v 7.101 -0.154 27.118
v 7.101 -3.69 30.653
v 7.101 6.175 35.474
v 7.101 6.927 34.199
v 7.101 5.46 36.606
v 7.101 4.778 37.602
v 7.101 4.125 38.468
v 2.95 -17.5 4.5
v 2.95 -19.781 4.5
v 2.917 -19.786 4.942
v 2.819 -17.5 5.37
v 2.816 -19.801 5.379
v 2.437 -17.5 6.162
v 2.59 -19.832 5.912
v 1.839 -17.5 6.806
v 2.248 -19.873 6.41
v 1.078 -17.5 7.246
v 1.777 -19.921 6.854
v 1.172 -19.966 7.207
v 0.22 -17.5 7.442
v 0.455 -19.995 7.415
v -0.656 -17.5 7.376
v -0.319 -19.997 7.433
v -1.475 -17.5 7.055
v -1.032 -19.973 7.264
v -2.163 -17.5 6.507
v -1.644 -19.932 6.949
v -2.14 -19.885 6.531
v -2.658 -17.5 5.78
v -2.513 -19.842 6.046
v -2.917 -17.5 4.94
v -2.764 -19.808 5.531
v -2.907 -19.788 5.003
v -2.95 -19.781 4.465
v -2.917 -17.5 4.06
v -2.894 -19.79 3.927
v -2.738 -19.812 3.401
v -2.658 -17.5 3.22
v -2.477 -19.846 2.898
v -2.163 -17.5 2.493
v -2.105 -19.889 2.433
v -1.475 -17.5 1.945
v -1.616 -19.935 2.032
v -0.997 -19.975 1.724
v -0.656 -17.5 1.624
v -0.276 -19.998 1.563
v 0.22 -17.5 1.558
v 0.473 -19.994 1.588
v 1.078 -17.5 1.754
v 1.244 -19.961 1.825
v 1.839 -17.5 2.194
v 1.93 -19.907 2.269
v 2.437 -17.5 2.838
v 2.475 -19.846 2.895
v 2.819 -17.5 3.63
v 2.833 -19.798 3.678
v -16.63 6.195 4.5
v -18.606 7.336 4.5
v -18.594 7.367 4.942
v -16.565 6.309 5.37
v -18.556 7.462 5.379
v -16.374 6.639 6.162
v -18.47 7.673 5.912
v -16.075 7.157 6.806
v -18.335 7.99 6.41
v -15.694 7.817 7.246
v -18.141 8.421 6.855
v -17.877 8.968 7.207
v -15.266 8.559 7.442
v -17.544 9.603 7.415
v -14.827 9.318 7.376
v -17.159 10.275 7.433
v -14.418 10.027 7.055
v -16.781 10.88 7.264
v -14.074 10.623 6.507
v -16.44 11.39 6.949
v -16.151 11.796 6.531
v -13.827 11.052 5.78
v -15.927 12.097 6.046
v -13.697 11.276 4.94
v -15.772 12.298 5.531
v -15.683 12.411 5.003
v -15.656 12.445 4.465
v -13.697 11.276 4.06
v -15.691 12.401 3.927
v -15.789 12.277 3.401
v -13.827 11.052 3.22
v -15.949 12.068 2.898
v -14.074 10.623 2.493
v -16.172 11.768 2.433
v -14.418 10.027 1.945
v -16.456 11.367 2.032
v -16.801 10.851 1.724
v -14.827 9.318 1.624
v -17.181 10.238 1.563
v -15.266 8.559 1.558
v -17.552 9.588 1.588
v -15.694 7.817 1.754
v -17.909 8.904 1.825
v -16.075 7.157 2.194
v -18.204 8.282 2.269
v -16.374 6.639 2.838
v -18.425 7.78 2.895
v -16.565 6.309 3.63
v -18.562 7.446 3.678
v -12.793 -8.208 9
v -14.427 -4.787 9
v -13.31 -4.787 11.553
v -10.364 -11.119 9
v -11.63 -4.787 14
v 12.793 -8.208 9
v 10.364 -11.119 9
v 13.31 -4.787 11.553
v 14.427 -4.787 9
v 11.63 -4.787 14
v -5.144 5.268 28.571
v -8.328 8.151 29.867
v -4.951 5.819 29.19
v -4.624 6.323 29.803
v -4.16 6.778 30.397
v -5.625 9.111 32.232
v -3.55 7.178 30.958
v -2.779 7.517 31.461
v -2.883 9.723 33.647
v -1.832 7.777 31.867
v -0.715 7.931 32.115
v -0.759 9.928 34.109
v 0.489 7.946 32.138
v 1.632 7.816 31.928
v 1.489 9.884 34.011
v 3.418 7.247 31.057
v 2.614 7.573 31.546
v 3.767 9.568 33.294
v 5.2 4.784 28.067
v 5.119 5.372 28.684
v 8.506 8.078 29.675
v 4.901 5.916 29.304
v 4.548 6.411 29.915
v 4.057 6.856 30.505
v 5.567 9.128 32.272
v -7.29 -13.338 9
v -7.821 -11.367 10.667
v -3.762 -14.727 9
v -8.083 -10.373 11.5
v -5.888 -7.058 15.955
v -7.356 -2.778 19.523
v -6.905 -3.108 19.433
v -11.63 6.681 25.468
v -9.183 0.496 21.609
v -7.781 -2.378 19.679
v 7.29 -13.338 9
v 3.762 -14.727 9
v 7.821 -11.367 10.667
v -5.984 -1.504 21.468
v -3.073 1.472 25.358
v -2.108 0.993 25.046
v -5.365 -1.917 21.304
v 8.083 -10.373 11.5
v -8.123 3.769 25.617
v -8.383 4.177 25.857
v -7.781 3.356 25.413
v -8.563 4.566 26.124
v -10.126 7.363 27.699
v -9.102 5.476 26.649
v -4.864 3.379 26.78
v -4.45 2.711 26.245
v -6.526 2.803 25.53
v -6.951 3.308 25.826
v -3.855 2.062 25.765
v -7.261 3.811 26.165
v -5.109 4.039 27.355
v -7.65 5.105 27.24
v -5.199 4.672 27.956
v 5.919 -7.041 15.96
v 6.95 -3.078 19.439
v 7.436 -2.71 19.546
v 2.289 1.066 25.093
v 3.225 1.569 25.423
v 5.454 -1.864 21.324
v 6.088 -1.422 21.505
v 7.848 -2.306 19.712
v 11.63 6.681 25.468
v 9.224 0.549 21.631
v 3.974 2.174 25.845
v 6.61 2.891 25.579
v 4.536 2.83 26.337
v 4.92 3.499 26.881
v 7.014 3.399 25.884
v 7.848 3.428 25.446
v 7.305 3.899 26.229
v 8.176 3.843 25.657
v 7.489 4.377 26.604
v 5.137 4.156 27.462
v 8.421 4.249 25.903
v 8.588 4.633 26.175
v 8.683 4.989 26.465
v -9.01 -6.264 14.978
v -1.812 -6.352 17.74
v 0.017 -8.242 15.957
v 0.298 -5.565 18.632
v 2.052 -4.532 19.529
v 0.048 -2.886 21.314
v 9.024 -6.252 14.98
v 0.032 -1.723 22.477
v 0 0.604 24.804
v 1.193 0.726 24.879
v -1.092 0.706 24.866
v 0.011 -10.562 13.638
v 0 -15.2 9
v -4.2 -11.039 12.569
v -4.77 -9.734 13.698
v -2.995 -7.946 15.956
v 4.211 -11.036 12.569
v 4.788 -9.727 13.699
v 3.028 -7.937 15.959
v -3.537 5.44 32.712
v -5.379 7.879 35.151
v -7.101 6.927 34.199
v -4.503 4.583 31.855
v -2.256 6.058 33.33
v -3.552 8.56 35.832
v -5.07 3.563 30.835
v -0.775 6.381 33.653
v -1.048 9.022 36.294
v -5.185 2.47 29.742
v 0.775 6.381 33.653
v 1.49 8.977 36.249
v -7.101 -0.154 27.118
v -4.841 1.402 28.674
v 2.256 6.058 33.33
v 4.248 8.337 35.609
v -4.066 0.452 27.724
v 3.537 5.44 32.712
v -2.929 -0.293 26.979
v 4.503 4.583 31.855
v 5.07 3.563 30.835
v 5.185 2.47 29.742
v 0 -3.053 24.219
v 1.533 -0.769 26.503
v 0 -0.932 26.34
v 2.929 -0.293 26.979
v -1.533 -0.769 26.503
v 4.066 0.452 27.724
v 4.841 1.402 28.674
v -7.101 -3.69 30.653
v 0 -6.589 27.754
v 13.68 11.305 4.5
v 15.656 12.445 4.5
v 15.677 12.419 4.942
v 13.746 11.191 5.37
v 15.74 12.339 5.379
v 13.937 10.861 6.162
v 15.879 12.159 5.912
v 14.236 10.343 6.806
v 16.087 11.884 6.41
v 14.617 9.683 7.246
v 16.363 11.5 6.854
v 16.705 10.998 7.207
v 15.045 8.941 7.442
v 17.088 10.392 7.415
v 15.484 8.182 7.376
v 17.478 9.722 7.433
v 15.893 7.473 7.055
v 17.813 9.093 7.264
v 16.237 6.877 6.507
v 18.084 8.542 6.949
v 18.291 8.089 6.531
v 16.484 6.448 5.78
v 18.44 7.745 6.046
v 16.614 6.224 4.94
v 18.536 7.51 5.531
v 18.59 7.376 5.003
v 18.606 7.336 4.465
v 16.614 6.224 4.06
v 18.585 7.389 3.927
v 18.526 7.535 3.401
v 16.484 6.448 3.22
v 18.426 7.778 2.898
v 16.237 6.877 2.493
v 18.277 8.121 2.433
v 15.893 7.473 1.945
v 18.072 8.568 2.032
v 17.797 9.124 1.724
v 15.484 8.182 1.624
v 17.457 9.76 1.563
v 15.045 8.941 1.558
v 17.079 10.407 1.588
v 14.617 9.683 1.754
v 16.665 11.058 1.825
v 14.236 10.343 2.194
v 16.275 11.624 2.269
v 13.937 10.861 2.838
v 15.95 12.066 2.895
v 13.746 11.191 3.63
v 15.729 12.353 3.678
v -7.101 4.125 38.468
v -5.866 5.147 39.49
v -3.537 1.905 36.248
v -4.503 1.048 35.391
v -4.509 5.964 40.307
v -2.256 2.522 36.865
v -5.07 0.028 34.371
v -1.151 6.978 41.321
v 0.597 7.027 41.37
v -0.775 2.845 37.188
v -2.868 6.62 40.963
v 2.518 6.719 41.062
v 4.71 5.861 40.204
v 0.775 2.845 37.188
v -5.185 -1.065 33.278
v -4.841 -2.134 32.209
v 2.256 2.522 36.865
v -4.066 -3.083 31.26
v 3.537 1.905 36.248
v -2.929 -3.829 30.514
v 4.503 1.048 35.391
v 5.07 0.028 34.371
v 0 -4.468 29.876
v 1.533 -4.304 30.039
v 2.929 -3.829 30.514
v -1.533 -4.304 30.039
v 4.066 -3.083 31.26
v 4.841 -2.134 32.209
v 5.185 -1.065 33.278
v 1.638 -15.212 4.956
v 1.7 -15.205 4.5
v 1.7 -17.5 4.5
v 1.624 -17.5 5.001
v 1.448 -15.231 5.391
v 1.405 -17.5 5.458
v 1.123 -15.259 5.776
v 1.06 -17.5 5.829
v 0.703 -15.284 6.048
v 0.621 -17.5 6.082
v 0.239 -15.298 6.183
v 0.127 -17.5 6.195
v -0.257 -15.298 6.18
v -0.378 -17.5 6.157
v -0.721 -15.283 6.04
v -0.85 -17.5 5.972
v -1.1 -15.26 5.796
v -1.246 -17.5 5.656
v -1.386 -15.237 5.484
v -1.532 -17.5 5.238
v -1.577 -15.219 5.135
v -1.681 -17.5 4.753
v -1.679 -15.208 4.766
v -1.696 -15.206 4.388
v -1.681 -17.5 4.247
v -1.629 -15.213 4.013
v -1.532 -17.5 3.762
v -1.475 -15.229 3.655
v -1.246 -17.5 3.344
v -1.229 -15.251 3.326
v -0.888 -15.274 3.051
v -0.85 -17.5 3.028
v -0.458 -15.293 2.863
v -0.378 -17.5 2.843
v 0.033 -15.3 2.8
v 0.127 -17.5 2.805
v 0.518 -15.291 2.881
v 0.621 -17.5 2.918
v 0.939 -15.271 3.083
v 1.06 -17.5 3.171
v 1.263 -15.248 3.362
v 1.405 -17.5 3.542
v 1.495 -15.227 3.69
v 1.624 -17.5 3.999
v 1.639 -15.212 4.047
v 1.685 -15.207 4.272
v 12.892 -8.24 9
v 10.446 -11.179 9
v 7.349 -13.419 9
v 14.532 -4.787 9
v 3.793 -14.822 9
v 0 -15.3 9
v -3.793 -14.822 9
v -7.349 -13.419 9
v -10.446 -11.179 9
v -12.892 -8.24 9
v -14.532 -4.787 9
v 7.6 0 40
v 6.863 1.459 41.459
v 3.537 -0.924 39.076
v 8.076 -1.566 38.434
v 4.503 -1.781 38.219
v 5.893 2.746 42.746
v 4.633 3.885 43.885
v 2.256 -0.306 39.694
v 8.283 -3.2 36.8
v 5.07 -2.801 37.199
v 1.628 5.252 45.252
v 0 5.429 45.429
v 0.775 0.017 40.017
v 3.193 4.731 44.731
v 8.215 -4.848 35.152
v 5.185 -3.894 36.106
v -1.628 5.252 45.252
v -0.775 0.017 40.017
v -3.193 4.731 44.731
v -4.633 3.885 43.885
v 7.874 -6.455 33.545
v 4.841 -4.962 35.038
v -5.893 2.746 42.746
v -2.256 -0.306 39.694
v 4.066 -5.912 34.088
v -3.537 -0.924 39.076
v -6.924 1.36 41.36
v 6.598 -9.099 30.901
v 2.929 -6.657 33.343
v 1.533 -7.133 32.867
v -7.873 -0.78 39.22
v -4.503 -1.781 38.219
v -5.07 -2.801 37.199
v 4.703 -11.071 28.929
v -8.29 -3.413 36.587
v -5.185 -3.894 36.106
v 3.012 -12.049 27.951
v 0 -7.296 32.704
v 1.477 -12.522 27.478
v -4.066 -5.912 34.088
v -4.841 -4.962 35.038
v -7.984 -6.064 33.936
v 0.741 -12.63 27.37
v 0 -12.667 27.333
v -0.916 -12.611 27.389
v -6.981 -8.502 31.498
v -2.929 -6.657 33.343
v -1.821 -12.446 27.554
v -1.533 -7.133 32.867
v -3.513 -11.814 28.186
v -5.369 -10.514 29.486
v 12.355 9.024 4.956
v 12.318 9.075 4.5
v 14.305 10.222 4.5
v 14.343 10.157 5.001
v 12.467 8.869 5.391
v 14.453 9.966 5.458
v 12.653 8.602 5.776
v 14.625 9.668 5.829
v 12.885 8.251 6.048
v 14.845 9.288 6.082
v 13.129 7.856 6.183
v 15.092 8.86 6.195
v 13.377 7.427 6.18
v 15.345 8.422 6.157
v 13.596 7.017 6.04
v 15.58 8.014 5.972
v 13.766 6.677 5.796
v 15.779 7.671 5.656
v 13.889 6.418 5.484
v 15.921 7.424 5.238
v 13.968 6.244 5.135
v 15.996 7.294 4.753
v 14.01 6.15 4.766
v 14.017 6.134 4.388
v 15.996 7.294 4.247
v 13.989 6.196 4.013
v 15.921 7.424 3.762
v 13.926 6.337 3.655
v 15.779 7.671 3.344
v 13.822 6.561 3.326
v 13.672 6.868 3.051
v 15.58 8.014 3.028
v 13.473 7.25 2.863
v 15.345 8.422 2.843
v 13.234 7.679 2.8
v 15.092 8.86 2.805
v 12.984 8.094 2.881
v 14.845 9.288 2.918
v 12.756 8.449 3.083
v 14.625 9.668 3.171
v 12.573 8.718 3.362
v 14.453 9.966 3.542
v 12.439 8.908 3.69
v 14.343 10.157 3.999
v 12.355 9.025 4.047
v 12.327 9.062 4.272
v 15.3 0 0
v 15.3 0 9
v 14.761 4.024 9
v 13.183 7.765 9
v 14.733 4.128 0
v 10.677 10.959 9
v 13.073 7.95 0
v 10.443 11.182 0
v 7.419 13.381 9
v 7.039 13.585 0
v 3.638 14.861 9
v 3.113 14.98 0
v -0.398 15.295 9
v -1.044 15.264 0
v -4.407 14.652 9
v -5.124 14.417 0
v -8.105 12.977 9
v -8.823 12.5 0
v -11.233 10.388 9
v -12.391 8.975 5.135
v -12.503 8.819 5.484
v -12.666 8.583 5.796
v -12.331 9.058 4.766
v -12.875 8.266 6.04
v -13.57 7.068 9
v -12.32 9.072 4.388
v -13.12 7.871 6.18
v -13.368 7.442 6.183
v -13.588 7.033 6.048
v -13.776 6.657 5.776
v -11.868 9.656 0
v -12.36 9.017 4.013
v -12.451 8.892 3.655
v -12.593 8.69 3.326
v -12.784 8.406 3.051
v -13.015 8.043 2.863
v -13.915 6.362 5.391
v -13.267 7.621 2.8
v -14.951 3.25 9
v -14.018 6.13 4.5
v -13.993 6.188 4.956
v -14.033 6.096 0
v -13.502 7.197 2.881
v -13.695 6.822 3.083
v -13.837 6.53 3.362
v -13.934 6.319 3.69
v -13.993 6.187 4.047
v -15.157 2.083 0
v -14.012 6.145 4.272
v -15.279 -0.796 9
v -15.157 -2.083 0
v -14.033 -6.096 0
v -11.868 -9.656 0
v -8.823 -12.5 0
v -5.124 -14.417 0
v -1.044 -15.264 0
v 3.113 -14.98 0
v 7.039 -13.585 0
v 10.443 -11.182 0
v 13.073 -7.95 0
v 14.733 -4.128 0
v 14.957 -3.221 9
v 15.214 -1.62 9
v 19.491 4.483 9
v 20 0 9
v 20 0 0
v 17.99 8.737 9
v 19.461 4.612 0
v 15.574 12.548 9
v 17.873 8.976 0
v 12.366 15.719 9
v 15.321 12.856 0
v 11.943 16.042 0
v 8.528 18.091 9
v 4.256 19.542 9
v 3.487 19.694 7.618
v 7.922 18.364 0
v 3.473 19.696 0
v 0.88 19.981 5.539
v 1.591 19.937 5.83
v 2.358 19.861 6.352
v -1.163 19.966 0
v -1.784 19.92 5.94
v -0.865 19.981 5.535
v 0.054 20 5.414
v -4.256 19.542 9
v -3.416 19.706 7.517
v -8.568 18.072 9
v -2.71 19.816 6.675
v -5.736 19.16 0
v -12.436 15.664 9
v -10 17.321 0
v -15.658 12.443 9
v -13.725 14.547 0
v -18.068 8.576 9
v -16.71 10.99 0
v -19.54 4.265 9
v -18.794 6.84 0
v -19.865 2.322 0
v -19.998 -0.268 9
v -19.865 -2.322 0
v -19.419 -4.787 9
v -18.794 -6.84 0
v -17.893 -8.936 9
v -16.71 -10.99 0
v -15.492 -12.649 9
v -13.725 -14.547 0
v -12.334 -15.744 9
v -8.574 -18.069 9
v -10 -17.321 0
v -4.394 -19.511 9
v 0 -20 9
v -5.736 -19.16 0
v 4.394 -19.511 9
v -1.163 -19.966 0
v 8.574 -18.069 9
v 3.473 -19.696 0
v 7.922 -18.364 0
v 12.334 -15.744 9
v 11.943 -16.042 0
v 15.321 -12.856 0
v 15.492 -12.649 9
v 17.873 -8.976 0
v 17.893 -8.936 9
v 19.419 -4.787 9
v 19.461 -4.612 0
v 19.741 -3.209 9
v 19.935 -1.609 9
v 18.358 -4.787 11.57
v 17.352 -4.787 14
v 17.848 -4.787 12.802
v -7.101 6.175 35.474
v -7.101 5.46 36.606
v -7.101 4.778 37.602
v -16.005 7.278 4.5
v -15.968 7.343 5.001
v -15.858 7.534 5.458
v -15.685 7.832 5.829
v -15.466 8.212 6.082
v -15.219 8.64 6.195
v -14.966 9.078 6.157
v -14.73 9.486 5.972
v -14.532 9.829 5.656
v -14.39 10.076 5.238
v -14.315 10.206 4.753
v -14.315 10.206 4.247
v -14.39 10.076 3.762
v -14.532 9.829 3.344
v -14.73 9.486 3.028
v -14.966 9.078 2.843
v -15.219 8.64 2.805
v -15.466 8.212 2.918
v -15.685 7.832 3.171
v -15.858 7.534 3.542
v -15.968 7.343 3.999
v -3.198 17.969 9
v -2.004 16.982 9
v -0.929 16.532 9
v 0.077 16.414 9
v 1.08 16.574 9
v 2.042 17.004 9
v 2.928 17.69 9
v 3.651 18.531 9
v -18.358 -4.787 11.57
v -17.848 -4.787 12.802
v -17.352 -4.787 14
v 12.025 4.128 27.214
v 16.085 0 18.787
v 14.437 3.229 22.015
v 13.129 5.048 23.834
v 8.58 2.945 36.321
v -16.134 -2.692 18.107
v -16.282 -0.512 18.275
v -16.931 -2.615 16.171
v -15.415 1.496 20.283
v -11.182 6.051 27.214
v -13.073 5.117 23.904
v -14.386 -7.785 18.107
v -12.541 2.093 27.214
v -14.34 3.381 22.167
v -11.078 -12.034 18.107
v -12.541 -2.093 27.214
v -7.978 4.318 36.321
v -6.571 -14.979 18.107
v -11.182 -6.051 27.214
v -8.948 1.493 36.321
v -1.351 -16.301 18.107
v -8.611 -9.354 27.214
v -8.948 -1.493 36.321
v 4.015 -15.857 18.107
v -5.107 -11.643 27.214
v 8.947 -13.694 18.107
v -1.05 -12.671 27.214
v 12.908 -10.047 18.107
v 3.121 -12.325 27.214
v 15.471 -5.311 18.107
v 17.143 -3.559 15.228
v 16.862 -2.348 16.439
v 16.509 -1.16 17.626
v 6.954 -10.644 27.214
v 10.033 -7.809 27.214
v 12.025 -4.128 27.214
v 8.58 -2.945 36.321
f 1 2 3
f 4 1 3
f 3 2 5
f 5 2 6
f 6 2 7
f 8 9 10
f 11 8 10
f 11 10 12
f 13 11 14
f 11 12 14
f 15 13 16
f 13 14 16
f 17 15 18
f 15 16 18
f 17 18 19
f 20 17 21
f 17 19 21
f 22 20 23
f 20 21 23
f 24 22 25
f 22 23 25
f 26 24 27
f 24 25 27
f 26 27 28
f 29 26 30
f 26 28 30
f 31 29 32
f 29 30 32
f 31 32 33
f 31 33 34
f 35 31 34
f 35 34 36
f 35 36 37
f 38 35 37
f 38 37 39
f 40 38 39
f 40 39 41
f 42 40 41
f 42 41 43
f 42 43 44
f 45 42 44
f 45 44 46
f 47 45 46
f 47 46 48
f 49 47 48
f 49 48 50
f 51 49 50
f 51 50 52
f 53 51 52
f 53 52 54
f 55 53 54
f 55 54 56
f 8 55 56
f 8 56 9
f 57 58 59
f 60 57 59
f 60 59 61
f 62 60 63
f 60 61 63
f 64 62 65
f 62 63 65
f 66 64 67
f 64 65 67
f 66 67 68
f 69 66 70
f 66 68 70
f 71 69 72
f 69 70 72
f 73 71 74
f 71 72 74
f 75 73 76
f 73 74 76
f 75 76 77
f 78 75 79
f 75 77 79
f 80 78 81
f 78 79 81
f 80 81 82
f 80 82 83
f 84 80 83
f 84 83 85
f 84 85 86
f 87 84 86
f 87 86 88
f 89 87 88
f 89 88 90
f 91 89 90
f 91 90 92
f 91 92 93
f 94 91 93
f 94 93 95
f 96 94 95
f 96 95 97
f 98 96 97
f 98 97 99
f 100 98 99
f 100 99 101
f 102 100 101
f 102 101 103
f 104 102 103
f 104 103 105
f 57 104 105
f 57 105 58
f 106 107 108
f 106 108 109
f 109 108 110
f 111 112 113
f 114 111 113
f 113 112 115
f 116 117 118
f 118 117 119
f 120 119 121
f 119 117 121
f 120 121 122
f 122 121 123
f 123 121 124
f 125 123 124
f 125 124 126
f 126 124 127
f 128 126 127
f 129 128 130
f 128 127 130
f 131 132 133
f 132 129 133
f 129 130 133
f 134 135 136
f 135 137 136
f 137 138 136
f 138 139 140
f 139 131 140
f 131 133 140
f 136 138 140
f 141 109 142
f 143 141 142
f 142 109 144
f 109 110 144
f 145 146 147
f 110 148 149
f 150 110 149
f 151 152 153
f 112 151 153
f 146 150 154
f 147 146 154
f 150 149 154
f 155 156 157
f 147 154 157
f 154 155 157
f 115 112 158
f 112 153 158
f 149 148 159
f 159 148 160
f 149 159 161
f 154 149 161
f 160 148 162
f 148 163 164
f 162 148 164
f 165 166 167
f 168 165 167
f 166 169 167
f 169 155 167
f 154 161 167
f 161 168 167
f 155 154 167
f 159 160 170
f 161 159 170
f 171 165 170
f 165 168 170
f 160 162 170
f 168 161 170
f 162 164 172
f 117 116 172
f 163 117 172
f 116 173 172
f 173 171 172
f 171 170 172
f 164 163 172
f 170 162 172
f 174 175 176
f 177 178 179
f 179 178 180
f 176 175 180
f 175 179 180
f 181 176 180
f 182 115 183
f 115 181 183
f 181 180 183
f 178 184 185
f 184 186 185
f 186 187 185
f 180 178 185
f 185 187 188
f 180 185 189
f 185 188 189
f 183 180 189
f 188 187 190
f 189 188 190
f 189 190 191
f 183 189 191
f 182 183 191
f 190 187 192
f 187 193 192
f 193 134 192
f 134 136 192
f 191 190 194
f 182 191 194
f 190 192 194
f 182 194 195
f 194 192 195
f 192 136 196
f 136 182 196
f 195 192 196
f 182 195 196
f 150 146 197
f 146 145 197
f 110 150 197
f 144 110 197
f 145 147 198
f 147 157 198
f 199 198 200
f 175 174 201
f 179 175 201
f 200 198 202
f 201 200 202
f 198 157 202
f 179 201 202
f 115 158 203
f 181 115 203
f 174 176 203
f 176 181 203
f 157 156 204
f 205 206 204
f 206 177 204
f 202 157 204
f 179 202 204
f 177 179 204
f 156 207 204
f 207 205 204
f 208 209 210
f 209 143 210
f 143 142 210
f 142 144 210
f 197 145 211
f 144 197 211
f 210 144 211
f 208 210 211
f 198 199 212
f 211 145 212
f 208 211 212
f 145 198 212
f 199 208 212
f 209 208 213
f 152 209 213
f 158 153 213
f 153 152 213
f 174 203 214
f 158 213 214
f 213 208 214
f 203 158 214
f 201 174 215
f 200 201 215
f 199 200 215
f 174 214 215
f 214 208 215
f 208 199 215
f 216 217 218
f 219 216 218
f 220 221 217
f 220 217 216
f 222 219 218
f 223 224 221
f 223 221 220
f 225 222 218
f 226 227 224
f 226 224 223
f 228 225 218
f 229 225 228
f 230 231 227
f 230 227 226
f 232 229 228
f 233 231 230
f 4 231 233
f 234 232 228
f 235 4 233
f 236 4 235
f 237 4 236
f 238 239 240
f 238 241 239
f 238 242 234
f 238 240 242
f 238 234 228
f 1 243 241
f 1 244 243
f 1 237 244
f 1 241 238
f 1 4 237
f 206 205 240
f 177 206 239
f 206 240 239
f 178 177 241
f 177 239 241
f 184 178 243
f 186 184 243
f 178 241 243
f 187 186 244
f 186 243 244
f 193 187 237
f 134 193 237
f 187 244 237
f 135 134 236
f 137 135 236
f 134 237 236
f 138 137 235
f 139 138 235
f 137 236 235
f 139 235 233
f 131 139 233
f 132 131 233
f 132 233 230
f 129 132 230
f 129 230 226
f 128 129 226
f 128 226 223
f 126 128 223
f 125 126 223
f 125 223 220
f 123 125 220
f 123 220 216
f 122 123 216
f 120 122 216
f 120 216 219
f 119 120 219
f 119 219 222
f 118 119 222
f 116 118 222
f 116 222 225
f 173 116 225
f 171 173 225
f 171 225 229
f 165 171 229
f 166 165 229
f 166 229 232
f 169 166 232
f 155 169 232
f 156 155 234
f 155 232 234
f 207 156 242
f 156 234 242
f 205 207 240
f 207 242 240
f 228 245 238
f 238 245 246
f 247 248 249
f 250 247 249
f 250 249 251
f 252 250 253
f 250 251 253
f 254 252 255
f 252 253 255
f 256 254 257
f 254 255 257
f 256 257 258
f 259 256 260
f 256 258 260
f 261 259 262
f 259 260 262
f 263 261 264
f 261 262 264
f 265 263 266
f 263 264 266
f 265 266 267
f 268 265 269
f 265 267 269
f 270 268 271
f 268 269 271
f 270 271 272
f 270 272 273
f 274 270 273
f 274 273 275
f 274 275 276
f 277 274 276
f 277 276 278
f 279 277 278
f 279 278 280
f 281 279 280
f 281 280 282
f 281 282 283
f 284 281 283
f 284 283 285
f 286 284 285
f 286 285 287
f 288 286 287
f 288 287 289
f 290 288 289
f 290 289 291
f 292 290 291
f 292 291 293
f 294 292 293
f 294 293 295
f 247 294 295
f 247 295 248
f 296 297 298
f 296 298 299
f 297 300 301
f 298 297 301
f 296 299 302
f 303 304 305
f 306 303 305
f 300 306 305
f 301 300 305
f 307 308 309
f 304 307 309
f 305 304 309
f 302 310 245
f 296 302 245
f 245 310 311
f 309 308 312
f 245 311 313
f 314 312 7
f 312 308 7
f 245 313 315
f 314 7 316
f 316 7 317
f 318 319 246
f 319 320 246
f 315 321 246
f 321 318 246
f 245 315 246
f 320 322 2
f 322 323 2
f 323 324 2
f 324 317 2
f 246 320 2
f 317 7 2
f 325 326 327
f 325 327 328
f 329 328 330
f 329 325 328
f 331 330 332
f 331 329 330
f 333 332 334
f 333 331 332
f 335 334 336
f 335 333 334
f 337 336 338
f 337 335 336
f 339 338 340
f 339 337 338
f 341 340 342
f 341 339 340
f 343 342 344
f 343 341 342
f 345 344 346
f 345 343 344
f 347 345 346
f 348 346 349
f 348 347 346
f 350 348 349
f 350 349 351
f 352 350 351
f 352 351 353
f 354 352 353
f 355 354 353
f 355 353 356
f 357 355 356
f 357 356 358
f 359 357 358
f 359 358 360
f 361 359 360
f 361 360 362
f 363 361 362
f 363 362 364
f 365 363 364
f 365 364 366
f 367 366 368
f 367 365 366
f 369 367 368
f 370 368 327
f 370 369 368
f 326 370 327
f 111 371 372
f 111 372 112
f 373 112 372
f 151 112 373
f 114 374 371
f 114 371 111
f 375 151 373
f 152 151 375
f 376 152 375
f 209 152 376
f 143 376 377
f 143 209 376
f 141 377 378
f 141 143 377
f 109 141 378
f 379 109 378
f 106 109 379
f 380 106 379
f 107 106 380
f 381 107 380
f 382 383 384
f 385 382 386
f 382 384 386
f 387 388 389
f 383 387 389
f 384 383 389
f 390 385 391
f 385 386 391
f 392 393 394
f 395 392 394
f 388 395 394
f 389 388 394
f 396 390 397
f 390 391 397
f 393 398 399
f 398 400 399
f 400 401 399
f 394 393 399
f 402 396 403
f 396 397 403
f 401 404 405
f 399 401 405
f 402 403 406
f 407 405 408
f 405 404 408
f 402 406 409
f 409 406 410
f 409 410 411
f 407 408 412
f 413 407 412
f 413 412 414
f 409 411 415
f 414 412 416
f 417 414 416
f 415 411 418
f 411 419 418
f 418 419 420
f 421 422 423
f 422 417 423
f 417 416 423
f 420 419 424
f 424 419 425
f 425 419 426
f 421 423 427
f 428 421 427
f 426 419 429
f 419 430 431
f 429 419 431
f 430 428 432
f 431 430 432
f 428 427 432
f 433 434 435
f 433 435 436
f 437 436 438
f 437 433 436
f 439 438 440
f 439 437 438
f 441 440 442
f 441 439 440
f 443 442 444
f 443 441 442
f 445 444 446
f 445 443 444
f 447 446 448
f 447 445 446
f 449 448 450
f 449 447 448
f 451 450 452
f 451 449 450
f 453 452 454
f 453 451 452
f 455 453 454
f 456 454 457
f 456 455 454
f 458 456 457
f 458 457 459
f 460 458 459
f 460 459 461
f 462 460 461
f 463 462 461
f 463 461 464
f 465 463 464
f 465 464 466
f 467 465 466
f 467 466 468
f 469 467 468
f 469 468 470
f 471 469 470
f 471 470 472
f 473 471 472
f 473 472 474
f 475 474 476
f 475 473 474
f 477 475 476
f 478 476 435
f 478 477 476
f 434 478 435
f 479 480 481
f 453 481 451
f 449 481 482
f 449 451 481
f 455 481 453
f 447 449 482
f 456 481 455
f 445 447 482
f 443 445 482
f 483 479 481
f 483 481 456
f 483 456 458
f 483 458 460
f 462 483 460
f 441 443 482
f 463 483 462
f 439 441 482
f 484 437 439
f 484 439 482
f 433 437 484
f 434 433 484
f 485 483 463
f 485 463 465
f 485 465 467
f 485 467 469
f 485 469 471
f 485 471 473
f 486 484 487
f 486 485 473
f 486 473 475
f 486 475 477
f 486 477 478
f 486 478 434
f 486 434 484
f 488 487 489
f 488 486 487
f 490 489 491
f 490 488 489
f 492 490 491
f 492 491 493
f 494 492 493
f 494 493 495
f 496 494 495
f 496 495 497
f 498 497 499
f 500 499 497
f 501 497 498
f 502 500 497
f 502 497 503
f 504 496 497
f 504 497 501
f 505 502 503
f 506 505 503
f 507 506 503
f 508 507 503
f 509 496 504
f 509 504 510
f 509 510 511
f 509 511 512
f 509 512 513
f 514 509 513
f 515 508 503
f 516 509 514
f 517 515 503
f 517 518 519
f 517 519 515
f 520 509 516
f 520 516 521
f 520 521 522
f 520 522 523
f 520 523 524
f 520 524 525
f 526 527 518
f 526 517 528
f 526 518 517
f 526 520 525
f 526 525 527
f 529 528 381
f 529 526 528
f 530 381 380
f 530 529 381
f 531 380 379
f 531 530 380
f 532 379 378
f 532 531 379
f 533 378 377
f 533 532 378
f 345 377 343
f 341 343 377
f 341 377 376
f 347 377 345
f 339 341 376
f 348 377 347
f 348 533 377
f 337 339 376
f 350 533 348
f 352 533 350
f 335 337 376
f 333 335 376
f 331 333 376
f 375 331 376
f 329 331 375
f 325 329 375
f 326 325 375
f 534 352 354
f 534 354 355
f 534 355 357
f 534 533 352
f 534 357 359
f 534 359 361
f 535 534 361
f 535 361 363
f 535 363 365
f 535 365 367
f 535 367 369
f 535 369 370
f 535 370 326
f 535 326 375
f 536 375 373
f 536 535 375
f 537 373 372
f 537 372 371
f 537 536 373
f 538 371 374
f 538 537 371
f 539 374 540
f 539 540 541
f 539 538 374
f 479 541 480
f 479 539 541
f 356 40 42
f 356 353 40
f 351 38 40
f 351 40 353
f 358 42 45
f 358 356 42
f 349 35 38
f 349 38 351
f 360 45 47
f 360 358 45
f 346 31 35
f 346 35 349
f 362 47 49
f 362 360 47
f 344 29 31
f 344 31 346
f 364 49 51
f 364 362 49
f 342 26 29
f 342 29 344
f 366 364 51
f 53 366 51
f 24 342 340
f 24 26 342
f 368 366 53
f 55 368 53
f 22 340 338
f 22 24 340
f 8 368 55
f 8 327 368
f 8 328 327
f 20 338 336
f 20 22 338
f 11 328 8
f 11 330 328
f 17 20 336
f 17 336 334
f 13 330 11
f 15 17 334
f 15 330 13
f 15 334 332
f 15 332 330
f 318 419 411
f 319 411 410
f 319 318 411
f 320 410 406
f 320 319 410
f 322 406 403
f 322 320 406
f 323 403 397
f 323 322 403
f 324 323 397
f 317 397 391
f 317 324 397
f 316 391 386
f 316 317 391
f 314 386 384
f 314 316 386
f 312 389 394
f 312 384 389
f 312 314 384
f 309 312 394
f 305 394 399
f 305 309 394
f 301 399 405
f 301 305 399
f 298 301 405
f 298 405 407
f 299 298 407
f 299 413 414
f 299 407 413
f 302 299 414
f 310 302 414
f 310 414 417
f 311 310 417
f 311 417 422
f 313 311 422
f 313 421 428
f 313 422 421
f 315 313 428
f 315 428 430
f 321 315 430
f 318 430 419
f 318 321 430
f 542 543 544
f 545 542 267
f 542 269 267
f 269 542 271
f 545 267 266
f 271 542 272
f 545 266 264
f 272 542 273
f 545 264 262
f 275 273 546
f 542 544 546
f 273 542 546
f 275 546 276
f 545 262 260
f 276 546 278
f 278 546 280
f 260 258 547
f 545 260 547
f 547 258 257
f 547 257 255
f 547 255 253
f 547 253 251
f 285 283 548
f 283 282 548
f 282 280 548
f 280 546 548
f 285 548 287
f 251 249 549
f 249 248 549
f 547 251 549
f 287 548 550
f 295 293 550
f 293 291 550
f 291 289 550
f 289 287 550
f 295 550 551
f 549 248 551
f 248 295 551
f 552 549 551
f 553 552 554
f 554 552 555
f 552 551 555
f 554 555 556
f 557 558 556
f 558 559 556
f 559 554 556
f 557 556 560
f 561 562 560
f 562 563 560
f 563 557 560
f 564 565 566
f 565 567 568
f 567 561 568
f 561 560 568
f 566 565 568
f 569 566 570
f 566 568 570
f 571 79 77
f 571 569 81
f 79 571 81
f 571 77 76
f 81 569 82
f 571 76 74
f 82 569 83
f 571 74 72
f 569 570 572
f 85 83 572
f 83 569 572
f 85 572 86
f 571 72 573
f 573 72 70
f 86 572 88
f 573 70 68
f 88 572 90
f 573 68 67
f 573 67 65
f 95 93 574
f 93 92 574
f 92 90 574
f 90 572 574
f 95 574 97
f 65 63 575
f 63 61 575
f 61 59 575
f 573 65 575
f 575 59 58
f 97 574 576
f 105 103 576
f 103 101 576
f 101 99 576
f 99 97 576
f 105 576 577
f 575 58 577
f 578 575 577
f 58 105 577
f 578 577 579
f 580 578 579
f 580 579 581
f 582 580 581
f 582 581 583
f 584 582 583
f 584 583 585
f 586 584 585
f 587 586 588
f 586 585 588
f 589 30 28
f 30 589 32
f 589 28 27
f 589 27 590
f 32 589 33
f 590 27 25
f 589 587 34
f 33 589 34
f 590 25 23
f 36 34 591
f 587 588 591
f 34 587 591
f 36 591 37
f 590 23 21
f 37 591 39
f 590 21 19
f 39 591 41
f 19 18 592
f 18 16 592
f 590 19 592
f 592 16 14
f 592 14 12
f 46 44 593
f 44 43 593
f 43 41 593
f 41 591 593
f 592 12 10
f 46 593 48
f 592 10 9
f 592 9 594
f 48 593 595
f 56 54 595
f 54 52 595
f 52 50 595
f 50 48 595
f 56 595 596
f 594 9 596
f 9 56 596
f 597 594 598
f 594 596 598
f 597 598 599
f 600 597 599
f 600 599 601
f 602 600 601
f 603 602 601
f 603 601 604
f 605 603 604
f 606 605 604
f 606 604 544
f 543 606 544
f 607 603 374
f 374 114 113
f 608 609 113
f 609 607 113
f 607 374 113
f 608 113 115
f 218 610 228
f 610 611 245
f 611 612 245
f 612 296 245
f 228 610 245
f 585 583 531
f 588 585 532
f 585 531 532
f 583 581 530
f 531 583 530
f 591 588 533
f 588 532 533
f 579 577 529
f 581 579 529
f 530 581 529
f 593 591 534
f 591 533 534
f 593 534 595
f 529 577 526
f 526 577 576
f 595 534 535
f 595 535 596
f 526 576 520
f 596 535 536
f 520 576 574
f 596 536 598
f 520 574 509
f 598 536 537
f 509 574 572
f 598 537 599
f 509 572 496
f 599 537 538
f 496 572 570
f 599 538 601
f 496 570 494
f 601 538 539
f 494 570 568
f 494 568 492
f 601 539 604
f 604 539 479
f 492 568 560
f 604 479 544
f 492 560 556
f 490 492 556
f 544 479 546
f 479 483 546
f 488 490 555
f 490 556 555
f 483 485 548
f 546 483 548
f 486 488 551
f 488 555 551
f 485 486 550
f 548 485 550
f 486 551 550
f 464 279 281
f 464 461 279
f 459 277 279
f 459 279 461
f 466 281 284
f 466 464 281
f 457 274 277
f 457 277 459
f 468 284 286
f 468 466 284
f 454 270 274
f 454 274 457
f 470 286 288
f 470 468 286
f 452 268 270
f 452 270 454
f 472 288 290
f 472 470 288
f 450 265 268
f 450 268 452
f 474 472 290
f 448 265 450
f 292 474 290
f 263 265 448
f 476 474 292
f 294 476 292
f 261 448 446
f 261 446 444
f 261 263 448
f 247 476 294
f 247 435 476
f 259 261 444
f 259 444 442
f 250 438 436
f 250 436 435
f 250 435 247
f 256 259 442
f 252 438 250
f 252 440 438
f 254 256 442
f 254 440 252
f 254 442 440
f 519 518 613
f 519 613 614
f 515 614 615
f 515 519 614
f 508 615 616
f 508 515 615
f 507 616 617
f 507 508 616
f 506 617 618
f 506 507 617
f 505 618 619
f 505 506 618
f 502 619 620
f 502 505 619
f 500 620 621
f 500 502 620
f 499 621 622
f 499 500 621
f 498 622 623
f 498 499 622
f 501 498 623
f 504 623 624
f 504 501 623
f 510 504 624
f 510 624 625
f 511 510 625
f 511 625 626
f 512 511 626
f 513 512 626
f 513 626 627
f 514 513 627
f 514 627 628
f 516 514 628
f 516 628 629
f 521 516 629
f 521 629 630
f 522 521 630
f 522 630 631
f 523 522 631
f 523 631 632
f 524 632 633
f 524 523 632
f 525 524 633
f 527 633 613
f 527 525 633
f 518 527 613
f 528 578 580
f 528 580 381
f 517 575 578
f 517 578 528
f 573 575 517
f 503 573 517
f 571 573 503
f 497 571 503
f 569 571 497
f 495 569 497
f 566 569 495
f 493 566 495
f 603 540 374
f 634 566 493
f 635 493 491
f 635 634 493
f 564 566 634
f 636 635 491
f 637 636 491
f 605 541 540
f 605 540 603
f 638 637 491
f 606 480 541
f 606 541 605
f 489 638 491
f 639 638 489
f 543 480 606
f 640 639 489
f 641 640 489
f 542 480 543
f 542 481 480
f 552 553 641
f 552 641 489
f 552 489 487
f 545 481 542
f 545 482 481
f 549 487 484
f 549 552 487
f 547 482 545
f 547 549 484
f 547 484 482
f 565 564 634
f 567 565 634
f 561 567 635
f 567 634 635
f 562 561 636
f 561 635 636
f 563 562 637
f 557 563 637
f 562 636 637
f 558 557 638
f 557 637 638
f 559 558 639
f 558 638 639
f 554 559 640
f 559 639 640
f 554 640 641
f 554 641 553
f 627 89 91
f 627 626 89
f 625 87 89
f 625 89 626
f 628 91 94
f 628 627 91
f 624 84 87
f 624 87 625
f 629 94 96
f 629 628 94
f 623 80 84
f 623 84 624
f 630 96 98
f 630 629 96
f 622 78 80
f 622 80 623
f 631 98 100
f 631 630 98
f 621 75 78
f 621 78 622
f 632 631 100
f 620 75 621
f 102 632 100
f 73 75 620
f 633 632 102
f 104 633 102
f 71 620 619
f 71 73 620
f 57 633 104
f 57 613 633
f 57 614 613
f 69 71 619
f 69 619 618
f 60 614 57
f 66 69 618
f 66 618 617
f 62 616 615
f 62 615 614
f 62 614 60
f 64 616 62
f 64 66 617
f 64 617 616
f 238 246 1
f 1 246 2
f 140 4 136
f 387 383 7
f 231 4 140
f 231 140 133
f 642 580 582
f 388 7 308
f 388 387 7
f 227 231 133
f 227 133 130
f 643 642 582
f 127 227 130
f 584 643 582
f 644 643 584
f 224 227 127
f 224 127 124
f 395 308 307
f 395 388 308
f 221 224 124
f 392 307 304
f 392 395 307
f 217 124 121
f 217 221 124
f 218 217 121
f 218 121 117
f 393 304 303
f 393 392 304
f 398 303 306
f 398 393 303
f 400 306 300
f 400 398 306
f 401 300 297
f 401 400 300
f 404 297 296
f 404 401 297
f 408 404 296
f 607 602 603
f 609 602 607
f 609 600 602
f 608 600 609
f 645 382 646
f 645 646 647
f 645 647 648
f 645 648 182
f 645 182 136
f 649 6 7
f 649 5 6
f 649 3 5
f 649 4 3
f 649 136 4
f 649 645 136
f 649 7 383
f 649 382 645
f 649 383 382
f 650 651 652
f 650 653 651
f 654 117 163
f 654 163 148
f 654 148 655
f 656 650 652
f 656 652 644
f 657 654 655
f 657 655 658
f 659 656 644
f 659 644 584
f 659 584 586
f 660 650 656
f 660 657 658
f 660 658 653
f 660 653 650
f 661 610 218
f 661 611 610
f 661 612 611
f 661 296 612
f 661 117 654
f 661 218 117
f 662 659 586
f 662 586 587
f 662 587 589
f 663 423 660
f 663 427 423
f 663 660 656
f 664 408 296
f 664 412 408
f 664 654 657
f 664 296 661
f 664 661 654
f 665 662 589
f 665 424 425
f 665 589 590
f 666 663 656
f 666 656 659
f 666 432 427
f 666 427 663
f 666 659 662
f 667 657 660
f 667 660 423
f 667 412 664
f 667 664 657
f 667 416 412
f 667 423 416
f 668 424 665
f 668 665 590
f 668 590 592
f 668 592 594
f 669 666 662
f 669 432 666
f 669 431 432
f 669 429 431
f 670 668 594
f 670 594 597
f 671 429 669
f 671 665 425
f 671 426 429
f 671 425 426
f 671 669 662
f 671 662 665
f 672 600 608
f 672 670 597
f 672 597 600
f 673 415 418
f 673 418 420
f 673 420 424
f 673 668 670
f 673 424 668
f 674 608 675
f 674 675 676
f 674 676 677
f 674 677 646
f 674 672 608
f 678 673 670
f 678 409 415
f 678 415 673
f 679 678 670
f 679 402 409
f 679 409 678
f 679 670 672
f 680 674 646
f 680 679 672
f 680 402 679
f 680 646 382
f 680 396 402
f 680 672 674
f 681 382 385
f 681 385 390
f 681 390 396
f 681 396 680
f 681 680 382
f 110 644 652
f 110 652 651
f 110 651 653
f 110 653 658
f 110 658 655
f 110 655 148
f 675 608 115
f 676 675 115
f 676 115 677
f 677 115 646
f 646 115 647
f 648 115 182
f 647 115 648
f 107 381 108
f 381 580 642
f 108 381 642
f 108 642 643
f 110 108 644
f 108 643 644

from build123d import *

# Parameters (mm, degrees)
POCKET002_DEPTH      = 20.001
POCKET002_DEPTH_BACK = -20.001
POCKET003_DEPTH      = 5
SKETCH004_R          = 5.2
POCKET004_DEPTH      = 26.045604
POCKET004_DEPTH_BACK = -21.981715
SKETCH007_R          = 15.2
SKETCH_R             = 20
SKETCH_R_2           = 15.3
PAD_DEPTH            = 9
SKETCH001_R          = 1.7
POCKET_DEPTH         = 134.561028
SKETCH002_R          = 2.95
POCKET001_DEPTH      = 2.5
SKETCH006_R          = 5.2
POCKET005_DEPTH      = 14.143136
POLARPATTERN_COUNT   = 3


with BuildPart() as body001:
    # Cone → Cone (revolve)
    with BuildSketch(Plane(origin=(0, 0, 9), x_dir=(1, 0, 0), z_dir=(0, -1, 0))):
        Polygon((0, 0), (20, 0), (0, 50), align=None)
    revolve(axis=Axis((0, 0, 9), (0, 0, 1)))

    # Sketch003 → Pocket002 (cut, two sides)
    with BuildSketch(Plane.YZ) as pocket002_sk:
        Polygon((22.25, 62.25), (-22.25, 17.75), (-27.75, 17.75), (-27.75, 67.75), (22.25, 67.75), align=None)
        Polygon((30.213203, 9), (-4.786797, 9), (-4.786797, 14), (30.213203, 49), align=None)
    extrude(amount=-POCKET002_DEPTH, mode=Mode.SUBTRACT)
    extrude(pocket002_sk.sketch, amount=-POCKET002_DEPTH_BACK, mode=Mode.SUBTRACT)

    # Sketch005 (on DatumPlane) → Pocket003 (cut)
    with BuildSketch(Plane(origin=(0, -0.79062, 33.552525), x_dir=(0, -0.707107, -0.707107), z_dir=(0, -0.707107, 0.707107))):
        Polygon((8.2, 0), (4.1, 7.101408), (-4.1, 7.101408), (-19.1, 7.101408), (-19.1, -7.101408), (-4.1, -7.101408), (4.1, -7.101408), align=None)
    extrude(amount=-POCKET003_DEPTH, mode=Mode.SUBTRACT)

    # Sketch004 (on DatumPlane) → Pocket004 (cut, two sides)
    with BuildSketch(Plane(origin=(0, -0.79062, 33.552525), x_dir=(0, -0.707107, -0.707107), z_dir=(0, -0.707107, 0.707107))) as pocket004_sk:
        Circle(SKETCH004_R)
    extrude(amount=-POCKET004_DEPTH, mode=Mode.SUBTRACT)
    extrude(pocket004_sk.sketch, amount=-POCKET004_DEPTH_BACK, mode=Mode.SUBTRACT)

    # SubtractivePipe: sweep along a path in Sketch008
    with BuildLine(Plane.YZ) as subtractivepipe_path:
        Line((0, 9), (28.284271, 37.284271))
    # Sketch007 (on Face1 of CopyPolarPattern) → SubtractivePipe (sweep, cut)
    with BuildSketch(Plane.XY.offset(9)):
        Circle(SKETCH007_R)
    sweep(path=subtractivepipe_path.line, mode=Mode.SUBTRACT)


with BuildPart() as body:
    # Sketch → Pad (new body)
    with BuildSketch(Plane.XY):
        Circle(SKETCH_R)
        Circle(SKETCH_R_2, mode=Mode.SUBTRACT)
    extrude(amount=PAD_DEPTH)

    # Sketch001 → Pocket (cut, through all)
    with BuildSketch(Plane.XZ):
        with Locations((0, 4.5)):
            Circle(SKETCH001_R)
    pocket = extrude(amount=POCKET_DEPTH, mode=Mode.SUBTRACT)

    # Sketch002 (on DatumPlane) → Pocket001 (cut)
    with BuildSketch(Plane.XZ.offset(20)):
        with Locations((0, 4.5)):
            Circle(SKETCH002_R)
    pocket001 = extrude(amount=-POCKET001_DEPTH, mode=Mode.SUBTRACT)

    # Sketch006 (on DatumPlane) → Pocket005 (cut, through all)
    with BuildSketch(Plane(origin=(0, 0, 0), x_dir=(1, 0, 0), z_dir=(0, -0.707107, 0.707107))):
        with Locations((0, 23.17)):
            Circle(SKETCH006_R)
    extrude(amount=-POCKET005_DEPTH, mode=Mode.SUBTRACT)

    # PolarPattern: Pocket, Pocket001 ×3 about axis
    polarpattern_axis = Axis((0, 0, 0), (0, 0, 1))
    for i in range(1, POLARPATTERN_COUNT):
        add(pocket.rotate(polarpattern_axis, i * 360 / POLARPATTERN_COUNT), mode=Mode.SUBTRACT)
        add(pocket001.rotate(polarpattern_axis, i * 360 / POLARPATTERN_COUNT), mode=Mode.SUBTRACT)

    # Boolean: union Body001
    add(body001.part)


solid = body.part
